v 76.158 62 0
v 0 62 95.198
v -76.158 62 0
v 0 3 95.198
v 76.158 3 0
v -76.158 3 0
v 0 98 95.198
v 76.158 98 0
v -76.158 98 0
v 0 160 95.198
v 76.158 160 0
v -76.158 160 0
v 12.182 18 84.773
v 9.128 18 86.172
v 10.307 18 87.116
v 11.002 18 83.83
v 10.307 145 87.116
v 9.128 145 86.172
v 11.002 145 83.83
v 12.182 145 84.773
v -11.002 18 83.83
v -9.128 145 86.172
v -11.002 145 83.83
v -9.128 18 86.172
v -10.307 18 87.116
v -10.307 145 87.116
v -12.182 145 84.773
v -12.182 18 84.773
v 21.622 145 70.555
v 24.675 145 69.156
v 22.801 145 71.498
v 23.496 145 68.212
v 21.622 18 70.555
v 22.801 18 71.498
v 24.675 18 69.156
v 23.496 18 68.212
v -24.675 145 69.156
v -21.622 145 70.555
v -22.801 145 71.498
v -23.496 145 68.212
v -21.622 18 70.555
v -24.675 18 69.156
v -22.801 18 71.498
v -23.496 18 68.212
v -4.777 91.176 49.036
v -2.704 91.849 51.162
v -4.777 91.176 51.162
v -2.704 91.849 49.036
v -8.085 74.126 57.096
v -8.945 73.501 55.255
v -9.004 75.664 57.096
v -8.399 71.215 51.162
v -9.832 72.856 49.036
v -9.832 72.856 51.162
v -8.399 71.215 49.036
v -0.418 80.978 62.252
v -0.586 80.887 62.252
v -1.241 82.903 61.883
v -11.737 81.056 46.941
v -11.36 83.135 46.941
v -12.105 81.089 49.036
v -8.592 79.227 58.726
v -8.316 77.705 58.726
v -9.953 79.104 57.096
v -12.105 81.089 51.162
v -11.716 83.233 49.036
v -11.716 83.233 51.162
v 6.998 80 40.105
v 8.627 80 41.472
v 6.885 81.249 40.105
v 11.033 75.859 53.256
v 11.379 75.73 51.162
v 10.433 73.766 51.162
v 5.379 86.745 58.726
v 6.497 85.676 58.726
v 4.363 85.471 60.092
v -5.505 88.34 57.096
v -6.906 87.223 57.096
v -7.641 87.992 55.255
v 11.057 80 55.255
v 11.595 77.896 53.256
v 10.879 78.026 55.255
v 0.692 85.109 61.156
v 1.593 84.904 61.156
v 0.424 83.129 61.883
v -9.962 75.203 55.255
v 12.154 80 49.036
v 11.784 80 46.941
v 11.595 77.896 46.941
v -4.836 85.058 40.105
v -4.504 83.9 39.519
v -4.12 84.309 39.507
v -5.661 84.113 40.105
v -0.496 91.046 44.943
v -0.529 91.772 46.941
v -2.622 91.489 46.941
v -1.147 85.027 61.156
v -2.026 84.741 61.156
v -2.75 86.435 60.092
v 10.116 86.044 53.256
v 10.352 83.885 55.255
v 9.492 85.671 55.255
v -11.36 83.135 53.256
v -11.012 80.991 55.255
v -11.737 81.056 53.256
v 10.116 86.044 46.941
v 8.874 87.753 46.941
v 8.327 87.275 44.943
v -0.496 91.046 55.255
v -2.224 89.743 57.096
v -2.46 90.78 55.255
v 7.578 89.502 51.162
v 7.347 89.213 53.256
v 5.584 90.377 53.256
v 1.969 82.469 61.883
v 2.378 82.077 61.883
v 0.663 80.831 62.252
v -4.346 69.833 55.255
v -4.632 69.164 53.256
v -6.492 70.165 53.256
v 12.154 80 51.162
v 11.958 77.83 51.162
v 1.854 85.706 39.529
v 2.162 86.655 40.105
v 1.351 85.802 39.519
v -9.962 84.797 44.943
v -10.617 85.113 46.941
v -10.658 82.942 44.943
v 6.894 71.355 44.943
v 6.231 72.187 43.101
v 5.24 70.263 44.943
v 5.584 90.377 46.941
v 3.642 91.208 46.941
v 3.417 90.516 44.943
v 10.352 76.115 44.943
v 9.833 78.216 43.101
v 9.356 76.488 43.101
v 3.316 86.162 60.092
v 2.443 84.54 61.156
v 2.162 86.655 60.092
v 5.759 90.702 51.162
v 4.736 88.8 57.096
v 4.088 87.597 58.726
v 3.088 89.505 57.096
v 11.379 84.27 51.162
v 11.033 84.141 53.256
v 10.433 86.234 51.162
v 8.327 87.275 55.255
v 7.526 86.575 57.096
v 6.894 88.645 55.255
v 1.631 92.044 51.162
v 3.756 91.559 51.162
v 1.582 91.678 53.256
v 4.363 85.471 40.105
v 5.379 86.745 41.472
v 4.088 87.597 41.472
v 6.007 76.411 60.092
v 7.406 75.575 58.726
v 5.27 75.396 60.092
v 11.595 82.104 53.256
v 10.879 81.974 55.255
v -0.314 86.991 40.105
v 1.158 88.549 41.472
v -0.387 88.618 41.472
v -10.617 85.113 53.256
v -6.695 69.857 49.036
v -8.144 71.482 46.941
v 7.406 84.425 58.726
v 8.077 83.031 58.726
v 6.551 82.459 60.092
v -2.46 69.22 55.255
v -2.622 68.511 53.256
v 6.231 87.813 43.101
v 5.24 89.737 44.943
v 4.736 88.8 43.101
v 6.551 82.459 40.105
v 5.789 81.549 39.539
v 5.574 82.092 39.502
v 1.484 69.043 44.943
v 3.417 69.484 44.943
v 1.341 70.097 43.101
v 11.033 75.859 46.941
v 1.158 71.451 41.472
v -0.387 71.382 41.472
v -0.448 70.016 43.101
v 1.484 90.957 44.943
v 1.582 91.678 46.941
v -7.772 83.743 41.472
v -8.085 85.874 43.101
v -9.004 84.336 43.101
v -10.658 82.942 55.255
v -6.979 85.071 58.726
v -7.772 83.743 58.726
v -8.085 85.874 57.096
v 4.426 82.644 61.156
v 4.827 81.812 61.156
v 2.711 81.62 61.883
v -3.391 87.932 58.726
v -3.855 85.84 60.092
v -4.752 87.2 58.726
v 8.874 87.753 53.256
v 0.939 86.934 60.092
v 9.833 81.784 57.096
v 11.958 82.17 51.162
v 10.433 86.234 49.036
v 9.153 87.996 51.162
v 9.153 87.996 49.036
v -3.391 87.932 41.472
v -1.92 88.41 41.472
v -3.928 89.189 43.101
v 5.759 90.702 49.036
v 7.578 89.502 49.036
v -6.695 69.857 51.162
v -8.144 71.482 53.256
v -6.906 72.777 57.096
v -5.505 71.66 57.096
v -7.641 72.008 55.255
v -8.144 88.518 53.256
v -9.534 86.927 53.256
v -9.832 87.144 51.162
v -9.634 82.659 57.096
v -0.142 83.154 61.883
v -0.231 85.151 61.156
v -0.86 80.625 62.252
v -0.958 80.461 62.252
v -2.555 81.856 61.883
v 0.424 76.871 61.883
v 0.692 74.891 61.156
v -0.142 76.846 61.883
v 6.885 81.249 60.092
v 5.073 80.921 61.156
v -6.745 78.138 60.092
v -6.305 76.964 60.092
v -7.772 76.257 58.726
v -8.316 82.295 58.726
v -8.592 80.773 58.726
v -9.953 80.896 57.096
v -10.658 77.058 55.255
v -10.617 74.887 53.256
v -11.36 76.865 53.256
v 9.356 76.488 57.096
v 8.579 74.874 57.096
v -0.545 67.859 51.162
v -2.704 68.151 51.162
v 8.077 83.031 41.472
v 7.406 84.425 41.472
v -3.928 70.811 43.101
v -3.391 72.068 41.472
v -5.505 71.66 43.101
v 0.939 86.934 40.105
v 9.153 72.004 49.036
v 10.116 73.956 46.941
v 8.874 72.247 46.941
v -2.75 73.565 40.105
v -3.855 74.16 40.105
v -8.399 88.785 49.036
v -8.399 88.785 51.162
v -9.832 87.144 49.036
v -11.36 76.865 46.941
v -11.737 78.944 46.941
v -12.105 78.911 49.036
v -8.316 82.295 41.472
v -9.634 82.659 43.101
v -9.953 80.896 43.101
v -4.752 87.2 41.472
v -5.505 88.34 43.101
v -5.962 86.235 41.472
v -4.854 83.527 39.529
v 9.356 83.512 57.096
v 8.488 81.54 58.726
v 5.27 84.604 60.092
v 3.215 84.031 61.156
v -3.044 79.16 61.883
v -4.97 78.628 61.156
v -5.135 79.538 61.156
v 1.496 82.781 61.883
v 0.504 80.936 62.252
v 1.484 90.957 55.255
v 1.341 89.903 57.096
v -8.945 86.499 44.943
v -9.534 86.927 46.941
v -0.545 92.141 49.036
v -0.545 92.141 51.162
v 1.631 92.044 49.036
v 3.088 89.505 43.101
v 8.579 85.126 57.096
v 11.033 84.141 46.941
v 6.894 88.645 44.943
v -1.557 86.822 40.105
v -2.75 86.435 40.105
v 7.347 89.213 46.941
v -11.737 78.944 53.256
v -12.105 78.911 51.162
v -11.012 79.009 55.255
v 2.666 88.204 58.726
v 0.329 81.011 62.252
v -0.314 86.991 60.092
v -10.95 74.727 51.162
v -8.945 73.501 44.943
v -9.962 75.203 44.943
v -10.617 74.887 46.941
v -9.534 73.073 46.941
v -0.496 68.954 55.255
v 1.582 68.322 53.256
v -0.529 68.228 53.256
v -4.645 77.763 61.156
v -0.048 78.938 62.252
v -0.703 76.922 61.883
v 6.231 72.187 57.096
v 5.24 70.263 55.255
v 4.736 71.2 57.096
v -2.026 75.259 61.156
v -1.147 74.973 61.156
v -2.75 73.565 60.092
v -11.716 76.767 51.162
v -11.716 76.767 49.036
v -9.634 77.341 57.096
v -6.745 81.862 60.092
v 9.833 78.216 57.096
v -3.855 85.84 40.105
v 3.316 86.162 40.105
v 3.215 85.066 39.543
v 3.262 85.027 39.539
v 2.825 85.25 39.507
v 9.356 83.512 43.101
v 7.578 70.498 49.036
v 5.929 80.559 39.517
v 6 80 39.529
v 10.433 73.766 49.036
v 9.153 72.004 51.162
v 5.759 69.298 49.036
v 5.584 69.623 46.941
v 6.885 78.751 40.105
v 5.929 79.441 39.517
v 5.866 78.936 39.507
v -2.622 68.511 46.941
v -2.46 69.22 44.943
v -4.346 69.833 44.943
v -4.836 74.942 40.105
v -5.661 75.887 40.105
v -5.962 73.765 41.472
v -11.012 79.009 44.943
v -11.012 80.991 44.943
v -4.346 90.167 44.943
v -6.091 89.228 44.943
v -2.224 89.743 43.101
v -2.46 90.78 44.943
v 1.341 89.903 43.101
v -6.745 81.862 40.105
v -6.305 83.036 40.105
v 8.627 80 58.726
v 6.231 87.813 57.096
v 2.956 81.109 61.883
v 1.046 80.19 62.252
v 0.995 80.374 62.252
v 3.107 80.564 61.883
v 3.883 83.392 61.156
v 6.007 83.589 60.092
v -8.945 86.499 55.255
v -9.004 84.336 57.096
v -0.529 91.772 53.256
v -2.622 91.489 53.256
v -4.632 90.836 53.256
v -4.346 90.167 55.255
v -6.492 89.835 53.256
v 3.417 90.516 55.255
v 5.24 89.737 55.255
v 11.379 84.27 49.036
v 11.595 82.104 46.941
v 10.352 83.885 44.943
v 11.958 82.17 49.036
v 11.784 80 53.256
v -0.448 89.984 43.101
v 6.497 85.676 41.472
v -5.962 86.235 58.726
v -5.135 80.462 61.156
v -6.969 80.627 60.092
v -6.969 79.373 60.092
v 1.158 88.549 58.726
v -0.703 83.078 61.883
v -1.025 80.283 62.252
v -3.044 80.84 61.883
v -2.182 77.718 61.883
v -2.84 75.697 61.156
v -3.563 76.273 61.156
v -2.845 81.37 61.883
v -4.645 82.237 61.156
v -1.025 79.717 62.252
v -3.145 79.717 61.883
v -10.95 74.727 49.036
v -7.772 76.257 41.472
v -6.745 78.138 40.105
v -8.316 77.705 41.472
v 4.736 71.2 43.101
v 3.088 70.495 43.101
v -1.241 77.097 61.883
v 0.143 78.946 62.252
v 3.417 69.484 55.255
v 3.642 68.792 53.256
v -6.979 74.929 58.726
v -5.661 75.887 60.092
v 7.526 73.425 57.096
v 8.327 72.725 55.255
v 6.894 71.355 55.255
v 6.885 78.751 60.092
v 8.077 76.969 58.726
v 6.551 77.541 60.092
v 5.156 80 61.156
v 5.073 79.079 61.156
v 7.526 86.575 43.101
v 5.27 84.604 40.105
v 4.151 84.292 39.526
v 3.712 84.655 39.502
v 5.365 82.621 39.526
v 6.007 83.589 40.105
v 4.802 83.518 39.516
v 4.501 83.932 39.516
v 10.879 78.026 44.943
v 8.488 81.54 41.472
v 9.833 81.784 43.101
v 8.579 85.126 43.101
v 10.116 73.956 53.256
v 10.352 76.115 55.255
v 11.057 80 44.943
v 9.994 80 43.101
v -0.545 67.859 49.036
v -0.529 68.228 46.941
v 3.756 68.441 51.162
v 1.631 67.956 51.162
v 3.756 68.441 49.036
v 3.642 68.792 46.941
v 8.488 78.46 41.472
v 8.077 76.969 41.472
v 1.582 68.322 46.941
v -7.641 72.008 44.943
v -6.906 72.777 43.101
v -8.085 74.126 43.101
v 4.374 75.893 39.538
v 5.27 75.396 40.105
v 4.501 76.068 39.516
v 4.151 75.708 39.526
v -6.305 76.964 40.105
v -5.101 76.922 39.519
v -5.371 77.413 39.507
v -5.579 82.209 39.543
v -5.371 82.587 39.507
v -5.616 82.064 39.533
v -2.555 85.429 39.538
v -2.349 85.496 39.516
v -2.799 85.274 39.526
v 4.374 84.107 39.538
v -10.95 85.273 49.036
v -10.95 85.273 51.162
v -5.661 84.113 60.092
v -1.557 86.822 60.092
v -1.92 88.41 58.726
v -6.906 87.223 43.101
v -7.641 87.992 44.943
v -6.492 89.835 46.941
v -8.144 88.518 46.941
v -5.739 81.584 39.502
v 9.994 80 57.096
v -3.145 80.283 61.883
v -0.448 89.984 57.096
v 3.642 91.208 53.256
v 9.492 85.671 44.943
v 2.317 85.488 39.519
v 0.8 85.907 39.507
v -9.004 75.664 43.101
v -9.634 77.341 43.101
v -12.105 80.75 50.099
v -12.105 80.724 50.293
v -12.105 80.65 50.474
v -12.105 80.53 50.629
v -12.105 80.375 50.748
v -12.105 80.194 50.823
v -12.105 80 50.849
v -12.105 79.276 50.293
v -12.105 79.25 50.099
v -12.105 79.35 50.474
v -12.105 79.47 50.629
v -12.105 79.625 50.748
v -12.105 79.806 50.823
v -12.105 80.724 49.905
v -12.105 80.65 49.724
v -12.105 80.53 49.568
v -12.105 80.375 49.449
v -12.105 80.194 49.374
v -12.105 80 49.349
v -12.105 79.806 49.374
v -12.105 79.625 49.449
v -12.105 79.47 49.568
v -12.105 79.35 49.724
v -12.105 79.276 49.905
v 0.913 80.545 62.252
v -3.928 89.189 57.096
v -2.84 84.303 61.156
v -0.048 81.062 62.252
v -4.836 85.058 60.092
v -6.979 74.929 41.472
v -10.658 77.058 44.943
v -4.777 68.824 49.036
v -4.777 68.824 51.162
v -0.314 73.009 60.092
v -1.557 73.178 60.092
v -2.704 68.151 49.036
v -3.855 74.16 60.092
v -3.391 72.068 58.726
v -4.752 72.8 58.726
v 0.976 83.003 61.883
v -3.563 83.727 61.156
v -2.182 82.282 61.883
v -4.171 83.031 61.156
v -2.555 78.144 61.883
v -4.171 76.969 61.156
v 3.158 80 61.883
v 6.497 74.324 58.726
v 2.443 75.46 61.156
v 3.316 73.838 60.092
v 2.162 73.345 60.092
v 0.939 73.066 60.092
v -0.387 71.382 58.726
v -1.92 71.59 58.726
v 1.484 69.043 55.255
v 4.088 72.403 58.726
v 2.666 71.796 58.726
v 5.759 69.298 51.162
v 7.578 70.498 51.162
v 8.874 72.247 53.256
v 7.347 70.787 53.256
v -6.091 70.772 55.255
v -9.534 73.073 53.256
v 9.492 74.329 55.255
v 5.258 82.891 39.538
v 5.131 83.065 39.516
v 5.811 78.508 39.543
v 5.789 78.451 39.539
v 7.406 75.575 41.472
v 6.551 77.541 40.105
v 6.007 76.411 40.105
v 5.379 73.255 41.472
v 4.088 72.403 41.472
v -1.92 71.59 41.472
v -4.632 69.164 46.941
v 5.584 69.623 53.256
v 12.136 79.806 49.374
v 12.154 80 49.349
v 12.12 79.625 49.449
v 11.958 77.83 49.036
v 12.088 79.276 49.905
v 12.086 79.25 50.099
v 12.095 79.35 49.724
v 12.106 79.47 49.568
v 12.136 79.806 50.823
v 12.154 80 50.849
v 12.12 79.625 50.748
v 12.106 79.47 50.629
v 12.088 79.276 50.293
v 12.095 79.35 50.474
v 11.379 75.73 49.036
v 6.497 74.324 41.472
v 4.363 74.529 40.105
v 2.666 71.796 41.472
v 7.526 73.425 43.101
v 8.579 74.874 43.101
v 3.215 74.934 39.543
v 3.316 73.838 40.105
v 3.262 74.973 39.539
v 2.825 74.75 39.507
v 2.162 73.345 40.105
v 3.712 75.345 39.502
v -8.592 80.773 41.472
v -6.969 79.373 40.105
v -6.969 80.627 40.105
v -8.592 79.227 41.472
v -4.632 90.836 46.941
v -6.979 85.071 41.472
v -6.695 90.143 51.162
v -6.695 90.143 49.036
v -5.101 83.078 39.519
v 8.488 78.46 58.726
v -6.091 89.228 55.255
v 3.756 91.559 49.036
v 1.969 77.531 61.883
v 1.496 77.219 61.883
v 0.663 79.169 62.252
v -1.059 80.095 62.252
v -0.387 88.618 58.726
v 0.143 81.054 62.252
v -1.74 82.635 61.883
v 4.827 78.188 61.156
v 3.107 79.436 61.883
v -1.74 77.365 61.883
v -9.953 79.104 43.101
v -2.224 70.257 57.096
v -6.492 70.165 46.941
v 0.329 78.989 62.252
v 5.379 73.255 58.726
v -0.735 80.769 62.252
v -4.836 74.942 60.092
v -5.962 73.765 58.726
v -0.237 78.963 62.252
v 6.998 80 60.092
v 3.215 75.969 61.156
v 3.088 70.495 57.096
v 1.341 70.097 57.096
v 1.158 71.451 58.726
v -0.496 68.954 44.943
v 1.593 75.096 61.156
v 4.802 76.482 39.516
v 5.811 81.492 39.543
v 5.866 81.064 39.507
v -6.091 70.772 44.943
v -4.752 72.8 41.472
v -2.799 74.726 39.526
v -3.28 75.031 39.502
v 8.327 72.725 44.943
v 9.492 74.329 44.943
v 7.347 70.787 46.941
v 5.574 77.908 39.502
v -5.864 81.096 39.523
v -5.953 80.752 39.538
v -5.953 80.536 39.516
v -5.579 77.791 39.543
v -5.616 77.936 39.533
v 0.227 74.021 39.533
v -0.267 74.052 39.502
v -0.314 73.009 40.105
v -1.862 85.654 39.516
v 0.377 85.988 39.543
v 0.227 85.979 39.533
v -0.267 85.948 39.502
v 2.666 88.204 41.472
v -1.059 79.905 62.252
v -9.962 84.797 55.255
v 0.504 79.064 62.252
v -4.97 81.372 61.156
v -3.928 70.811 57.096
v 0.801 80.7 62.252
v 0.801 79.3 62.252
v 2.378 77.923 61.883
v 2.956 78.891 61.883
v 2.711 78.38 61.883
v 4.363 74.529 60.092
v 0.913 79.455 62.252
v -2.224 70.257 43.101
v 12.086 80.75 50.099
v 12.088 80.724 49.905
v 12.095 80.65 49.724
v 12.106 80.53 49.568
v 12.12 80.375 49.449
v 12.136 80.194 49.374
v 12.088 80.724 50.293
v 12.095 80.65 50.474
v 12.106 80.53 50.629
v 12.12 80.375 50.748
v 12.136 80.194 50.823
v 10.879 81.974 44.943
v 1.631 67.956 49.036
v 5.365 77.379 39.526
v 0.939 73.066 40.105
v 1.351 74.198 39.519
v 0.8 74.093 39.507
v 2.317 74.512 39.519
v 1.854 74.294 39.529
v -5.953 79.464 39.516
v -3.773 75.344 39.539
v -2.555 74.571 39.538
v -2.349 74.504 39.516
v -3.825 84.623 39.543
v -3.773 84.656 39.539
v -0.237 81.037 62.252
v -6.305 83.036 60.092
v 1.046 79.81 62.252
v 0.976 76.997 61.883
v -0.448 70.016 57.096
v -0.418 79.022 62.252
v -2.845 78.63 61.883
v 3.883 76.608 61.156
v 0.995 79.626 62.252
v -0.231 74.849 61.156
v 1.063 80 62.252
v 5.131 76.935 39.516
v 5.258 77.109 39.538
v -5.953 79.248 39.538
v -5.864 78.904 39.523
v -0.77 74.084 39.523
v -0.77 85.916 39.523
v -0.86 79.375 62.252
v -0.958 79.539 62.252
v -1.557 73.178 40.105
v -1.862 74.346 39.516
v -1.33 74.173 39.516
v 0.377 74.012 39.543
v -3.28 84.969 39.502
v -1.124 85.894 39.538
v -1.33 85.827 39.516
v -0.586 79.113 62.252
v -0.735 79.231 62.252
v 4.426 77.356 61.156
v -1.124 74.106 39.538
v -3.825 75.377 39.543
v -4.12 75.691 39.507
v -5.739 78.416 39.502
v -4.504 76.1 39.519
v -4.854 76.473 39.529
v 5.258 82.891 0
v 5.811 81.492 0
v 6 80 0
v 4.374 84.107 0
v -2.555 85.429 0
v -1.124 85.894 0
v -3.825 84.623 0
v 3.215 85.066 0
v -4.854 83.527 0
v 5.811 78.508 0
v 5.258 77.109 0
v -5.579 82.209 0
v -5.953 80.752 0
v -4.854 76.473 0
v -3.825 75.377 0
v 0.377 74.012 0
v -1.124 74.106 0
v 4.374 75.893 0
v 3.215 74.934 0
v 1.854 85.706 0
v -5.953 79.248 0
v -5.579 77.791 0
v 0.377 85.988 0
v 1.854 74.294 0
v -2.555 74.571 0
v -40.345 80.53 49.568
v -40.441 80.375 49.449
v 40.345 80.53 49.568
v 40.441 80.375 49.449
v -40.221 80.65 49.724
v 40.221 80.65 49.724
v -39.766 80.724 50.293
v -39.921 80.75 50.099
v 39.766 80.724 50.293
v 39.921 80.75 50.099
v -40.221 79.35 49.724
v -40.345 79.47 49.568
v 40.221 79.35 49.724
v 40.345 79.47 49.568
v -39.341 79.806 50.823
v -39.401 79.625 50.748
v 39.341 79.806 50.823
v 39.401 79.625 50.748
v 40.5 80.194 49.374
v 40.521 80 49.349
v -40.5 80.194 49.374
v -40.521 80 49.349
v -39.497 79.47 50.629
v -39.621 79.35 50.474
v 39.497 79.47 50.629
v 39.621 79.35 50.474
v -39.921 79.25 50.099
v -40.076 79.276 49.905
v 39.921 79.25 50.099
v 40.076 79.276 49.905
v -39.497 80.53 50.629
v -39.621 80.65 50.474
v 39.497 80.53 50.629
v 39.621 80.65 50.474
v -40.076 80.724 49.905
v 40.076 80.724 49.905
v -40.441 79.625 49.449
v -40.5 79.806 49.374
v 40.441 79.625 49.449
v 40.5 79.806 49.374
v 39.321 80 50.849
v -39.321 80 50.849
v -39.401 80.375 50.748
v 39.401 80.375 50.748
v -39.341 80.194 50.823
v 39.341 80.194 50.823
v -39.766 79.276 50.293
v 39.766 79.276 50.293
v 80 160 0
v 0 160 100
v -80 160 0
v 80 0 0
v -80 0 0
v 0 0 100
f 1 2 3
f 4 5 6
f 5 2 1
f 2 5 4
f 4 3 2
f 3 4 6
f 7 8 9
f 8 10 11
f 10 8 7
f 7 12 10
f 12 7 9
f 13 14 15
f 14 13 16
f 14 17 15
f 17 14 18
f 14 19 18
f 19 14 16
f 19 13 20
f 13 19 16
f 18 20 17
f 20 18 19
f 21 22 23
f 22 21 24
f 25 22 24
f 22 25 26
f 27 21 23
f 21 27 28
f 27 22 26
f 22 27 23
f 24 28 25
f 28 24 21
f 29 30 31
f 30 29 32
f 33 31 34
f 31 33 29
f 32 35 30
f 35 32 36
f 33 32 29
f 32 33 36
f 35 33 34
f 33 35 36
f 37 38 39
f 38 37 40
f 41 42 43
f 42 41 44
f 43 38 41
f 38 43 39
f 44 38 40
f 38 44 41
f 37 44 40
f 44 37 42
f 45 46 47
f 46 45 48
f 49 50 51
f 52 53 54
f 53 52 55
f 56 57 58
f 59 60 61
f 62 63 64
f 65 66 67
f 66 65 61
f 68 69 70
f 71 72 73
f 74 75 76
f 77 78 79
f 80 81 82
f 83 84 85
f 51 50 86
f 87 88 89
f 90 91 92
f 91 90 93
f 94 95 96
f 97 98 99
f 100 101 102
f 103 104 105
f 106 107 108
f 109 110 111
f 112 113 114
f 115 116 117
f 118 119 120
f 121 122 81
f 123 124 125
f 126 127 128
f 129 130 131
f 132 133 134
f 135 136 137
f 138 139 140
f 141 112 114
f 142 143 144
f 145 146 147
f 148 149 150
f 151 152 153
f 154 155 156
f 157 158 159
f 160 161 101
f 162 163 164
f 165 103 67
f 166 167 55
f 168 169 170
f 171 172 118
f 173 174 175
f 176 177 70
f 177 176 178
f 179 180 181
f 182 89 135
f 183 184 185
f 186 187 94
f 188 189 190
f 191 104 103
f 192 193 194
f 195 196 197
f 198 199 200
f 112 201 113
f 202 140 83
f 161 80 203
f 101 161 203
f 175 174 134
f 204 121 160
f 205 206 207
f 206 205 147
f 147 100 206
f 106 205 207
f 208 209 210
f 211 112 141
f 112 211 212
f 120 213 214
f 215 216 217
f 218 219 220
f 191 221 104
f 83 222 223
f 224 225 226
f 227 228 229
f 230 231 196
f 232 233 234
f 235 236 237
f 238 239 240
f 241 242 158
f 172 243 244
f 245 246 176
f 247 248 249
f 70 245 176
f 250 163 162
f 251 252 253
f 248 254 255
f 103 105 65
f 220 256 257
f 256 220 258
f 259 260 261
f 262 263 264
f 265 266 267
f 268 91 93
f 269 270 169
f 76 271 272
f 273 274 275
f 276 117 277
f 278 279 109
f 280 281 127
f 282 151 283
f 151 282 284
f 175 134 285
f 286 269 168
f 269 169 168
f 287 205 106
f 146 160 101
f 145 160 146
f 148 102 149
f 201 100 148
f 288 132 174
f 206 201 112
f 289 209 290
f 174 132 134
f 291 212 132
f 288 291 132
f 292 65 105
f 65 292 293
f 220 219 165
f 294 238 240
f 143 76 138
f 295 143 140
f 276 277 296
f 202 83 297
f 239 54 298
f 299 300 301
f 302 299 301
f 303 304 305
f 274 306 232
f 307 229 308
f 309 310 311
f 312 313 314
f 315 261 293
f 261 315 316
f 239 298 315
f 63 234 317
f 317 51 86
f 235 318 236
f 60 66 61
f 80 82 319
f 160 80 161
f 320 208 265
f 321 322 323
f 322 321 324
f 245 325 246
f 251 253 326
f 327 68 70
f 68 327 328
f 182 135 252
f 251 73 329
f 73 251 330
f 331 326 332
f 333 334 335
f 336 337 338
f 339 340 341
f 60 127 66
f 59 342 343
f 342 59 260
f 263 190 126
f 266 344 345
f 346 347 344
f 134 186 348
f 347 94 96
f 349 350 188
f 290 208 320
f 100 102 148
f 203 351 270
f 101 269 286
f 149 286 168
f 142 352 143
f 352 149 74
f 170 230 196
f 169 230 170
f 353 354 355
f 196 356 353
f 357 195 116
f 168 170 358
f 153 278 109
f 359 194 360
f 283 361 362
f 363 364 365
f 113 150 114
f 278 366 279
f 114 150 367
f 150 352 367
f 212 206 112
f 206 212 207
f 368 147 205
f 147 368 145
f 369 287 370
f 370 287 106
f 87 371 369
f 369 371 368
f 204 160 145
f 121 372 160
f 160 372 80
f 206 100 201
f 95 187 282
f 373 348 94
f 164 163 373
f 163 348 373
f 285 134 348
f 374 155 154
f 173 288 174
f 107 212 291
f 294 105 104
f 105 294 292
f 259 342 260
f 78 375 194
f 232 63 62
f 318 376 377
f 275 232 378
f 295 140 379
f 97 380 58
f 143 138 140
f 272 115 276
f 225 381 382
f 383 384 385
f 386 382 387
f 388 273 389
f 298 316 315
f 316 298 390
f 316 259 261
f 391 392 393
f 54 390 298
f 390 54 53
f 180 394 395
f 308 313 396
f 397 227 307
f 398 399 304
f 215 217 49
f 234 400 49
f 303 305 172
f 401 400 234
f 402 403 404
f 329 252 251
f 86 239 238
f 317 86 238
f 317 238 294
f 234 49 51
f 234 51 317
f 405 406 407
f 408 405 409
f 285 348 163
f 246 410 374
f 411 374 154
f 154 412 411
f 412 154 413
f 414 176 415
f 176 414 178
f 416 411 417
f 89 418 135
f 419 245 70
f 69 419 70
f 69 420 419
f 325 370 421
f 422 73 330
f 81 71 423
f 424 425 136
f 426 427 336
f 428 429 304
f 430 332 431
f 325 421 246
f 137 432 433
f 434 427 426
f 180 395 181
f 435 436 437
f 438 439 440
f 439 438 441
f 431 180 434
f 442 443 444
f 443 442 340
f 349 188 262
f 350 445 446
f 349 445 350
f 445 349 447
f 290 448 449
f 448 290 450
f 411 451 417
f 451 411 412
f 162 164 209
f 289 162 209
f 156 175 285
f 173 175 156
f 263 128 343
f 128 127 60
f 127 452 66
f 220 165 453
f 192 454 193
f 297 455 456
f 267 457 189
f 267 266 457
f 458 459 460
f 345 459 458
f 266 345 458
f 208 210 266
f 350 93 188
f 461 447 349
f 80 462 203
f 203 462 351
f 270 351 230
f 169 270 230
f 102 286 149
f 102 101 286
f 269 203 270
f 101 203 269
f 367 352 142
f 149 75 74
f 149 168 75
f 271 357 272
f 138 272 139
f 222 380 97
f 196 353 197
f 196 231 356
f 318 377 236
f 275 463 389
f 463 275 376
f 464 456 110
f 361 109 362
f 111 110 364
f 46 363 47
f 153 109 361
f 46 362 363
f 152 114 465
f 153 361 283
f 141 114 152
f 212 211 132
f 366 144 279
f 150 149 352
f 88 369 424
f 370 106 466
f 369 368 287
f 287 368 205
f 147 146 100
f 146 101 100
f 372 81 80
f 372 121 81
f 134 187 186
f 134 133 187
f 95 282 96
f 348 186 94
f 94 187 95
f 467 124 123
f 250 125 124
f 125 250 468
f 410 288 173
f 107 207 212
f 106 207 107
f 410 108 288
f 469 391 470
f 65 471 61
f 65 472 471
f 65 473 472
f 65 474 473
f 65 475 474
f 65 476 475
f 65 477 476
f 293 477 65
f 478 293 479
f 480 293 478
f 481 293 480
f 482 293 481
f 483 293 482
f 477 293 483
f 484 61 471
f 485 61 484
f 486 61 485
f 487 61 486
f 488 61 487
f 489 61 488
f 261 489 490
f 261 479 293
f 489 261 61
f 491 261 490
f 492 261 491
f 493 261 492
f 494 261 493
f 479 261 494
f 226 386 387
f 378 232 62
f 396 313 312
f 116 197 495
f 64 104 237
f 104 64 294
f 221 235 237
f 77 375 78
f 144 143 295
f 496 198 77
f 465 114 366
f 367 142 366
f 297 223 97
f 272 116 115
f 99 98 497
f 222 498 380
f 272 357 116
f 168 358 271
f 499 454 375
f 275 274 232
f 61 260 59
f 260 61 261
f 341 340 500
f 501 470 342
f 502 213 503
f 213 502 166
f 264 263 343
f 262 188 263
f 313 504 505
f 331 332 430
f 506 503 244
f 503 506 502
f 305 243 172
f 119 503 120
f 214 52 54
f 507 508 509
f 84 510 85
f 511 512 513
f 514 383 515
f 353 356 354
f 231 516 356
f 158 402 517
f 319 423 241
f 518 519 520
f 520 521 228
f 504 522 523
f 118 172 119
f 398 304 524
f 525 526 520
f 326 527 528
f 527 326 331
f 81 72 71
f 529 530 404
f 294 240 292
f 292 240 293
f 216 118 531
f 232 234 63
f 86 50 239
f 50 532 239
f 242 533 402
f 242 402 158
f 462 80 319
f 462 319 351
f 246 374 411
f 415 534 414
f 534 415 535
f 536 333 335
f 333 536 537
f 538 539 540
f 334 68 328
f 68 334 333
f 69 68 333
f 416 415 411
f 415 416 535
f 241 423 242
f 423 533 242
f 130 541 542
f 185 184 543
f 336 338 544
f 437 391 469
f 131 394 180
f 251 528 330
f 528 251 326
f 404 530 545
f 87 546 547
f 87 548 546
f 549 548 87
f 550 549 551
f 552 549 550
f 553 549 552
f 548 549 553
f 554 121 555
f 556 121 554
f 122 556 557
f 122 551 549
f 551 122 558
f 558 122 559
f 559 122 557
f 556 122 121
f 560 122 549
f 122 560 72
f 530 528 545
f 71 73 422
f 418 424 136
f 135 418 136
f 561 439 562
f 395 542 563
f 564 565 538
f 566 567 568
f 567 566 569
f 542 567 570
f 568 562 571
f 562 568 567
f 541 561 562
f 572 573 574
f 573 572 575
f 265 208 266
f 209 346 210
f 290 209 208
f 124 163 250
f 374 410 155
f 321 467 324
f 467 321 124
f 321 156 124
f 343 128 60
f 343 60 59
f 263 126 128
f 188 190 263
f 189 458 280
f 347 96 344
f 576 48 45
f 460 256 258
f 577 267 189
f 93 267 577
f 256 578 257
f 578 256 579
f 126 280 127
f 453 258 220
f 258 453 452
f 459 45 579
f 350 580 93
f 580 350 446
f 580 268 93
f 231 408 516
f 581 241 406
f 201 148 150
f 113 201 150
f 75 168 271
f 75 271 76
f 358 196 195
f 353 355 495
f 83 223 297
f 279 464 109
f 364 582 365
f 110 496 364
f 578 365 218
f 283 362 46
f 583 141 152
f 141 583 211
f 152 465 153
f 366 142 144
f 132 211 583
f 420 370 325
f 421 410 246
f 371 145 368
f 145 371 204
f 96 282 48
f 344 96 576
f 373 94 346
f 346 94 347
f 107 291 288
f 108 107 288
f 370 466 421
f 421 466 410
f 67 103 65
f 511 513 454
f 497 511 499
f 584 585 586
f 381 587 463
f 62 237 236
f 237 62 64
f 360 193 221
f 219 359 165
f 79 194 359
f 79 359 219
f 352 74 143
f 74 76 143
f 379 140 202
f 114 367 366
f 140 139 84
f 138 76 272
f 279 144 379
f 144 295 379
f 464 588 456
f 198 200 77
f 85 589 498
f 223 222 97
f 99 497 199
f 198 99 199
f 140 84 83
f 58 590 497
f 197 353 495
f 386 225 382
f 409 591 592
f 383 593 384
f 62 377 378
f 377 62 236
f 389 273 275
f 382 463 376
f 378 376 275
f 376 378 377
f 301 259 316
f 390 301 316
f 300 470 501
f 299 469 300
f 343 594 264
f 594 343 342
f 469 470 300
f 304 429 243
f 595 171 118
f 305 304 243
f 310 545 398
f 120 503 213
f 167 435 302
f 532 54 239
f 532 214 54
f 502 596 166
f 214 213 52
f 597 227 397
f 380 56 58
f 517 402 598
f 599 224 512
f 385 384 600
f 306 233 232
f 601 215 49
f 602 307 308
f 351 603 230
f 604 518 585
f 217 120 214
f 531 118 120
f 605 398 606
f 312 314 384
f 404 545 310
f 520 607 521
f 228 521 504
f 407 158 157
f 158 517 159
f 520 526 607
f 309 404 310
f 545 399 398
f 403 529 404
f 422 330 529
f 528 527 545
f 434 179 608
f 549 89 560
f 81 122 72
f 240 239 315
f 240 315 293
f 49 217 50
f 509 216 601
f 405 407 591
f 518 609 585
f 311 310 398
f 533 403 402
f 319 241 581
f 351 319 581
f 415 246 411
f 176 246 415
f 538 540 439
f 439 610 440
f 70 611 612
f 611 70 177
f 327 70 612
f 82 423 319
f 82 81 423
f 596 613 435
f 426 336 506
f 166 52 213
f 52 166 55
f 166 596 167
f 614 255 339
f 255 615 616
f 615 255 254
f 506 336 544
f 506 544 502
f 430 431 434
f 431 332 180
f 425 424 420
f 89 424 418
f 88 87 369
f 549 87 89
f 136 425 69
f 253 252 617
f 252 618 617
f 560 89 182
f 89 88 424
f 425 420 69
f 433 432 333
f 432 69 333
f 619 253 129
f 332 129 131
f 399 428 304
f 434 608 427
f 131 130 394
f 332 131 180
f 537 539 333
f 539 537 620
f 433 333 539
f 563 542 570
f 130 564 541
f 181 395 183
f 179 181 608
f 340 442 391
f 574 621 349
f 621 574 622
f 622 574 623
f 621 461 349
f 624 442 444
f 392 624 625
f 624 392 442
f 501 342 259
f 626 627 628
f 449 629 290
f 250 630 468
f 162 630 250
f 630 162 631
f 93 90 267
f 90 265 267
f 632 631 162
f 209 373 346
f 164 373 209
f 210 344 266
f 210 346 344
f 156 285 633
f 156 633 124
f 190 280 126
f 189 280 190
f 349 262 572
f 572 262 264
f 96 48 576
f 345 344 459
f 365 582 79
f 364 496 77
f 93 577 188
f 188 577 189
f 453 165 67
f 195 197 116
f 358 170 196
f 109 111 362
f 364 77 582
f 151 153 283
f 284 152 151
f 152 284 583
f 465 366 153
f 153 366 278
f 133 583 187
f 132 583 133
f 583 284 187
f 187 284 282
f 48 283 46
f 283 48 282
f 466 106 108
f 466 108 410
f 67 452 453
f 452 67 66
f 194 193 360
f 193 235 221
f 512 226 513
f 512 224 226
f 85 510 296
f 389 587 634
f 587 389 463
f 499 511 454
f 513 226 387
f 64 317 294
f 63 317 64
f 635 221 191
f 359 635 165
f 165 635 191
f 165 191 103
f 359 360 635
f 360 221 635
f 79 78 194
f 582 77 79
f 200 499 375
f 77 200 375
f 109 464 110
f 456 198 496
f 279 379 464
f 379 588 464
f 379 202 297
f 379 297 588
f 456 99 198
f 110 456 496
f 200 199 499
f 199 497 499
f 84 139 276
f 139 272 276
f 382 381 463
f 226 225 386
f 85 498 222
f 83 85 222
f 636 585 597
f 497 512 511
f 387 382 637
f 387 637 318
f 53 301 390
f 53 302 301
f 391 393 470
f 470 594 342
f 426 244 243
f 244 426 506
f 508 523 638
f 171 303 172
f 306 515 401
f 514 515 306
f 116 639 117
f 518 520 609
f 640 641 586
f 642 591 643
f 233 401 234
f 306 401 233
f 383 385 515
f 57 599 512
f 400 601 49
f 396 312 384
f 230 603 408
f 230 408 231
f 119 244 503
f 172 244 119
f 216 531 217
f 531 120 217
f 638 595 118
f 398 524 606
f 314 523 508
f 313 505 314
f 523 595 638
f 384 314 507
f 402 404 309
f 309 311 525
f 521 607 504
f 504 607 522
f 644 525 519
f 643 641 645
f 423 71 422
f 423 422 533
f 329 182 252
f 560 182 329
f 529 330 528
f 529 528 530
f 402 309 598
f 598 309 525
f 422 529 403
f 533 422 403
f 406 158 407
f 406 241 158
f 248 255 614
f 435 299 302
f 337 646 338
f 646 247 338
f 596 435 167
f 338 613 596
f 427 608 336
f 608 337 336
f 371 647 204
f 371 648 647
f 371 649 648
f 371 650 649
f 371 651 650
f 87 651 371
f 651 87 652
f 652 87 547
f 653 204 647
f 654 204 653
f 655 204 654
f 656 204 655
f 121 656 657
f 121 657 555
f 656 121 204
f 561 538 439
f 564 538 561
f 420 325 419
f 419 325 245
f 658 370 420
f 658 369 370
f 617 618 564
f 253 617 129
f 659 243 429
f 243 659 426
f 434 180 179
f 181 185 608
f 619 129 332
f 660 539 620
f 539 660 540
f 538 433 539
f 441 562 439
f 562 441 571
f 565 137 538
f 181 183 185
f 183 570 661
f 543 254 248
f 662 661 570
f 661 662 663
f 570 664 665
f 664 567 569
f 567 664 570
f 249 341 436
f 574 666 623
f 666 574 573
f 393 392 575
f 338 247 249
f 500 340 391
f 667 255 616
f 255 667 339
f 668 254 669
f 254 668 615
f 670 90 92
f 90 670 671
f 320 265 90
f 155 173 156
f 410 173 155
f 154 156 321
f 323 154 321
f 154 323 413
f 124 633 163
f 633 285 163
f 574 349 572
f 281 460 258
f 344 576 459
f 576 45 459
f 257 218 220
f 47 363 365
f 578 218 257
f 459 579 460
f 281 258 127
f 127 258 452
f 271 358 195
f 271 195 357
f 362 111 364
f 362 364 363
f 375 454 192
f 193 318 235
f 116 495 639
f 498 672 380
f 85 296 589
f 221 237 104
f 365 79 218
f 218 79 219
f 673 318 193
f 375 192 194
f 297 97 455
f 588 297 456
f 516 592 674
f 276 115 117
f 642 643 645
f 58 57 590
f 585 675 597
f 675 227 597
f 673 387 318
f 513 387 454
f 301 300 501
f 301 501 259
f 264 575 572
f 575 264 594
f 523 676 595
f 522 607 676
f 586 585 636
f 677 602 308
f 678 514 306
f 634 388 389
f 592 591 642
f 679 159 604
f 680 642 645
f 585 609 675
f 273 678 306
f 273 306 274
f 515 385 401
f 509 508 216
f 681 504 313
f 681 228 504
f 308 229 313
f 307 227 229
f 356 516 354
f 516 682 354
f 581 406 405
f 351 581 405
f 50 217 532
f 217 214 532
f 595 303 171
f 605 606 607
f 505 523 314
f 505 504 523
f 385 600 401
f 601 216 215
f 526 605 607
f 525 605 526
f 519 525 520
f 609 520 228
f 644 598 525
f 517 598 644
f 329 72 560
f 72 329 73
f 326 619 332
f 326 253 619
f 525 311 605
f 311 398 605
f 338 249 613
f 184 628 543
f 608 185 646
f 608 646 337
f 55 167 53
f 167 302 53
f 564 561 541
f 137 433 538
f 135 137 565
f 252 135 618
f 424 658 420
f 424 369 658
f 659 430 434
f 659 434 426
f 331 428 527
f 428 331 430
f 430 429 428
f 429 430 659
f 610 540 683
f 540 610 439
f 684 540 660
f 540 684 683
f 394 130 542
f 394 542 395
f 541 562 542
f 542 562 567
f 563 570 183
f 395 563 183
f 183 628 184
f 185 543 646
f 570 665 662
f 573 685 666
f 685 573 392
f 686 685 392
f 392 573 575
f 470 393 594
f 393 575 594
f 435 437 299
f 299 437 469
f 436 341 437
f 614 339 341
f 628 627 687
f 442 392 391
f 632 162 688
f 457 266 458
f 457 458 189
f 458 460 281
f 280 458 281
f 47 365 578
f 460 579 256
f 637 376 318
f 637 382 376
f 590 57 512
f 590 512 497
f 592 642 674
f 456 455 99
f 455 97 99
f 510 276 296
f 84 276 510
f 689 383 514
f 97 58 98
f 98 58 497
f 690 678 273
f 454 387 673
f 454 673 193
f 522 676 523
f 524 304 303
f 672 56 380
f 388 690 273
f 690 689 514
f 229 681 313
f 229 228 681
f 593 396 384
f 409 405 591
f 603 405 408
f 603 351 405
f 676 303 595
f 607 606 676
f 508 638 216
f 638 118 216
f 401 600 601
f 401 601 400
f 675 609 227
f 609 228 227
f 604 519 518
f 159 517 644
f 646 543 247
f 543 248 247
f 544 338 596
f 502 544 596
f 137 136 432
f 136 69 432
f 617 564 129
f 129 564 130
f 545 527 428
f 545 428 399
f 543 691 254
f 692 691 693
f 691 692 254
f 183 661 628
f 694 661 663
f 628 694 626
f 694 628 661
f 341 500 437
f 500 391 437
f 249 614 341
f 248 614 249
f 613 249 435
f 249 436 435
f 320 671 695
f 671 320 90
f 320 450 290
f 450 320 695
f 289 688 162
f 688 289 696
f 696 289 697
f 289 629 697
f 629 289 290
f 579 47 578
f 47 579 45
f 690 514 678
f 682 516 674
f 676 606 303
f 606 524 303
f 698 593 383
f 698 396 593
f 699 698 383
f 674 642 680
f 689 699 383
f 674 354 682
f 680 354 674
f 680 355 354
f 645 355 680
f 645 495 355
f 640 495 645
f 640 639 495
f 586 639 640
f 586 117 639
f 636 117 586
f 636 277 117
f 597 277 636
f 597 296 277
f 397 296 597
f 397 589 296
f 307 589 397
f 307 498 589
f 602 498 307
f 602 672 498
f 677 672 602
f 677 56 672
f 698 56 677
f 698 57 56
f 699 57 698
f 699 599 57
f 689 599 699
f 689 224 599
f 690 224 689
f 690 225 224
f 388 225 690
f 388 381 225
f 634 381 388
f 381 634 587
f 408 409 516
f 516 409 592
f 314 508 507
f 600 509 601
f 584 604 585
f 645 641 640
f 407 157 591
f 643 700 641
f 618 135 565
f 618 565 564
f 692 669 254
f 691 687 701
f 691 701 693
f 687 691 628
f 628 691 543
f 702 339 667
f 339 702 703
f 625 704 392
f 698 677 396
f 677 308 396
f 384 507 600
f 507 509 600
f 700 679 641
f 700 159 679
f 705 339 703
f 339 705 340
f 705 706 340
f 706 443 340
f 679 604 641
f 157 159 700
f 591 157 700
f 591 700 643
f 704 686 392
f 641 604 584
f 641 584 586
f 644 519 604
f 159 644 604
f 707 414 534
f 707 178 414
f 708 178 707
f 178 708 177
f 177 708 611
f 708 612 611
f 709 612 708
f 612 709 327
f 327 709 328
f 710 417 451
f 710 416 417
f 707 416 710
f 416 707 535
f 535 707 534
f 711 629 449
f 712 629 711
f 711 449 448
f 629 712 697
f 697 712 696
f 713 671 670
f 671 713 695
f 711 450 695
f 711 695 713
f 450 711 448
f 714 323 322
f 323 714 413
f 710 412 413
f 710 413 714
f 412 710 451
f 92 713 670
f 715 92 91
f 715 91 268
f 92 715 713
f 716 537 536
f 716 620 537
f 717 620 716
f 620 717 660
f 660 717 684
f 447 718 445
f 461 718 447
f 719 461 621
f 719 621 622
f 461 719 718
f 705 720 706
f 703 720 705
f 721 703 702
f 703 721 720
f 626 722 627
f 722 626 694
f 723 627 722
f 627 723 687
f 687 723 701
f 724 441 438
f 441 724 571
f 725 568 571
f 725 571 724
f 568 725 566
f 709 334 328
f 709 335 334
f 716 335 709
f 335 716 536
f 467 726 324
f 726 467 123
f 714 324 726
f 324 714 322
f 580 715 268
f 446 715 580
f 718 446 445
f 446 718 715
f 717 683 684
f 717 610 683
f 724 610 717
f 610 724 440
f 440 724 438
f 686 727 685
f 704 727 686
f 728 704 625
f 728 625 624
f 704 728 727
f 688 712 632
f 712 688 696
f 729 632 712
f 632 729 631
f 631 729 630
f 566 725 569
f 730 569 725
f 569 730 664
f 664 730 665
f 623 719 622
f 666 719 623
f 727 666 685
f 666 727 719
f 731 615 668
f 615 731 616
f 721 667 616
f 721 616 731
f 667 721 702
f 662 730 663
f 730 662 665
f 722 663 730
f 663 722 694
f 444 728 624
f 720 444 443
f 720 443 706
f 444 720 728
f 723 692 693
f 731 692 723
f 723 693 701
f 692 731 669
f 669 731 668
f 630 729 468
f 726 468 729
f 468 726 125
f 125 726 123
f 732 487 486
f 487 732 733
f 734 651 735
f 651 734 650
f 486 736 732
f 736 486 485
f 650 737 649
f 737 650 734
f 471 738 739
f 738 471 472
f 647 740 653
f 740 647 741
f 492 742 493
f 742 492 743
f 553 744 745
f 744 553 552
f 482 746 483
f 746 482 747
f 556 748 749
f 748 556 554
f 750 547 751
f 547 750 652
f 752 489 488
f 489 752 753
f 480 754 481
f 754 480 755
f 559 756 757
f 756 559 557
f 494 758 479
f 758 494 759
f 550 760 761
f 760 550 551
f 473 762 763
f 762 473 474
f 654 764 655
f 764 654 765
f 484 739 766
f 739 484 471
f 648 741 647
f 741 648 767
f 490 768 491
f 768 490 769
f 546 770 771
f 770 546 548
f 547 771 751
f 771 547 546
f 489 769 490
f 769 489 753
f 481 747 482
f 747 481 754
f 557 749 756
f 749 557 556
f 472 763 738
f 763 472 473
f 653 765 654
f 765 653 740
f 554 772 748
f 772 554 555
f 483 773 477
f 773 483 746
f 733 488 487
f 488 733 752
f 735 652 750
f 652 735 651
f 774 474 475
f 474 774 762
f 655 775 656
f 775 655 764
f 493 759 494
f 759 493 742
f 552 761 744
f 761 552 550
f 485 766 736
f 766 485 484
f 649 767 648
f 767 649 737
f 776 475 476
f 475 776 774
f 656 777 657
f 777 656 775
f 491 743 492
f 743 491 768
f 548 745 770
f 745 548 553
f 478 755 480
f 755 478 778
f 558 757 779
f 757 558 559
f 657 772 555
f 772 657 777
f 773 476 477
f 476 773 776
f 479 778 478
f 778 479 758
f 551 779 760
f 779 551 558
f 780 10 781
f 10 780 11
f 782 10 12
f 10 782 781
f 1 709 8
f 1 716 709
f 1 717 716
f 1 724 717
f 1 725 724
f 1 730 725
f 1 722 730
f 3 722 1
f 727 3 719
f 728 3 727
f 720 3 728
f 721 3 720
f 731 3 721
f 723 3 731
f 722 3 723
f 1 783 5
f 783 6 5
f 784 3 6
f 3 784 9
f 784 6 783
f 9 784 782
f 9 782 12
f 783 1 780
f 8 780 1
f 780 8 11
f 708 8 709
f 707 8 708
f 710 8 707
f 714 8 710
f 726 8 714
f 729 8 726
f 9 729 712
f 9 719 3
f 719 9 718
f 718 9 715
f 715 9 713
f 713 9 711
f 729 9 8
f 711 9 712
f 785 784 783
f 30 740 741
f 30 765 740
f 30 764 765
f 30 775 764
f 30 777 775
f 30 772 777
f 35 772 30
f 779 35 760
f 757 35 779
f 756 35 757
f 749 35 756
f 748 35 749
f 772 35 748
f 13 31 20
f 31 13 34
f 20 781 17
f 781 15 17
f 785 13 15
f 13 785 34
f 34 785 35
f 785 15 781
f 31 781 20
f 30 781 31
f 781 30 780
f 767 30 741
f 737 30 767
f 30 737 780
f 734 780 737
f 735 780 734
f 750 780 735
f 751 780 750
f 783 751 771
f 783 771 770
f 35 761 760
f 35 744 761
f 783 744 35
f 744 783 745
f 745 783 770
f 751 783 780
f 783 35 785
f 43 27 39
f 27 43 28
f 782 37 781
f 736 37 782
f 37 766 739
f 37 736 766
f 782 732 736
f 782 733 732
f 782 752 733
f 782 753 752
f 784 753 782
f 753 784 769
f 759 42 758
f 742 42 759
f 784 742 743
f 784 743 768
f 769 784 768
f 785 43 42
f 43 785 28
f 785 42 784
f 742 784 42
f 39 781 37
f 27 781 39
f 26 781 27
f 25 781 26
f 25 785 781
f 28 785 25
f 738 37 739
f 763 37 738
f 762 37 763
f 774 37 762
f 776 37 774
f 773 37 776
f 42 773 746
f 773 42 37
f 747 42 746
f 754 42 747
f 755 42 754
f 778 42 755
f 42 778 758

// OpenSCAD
// ============================================================================
// KORPUS "MORPH" v7 - glowica SZLIFIERKI NAROZNEJ (corner sander)
// do plyt gipsowo-kartonowych, montowana na dragu teleskopowym.
// ----------------------------------------------------------------------------
// Geometria: klin Λ o profilu trojkatnym.
//   - przednia scianka ZAMKNIETA (trojkatna plansza z napisem "morph" wypuklym)
//   - tylny koniec OTWARTY (zaokraglone konce skrzydel - opcjonalne)
//   - wnetrze PUSTE ("BE HOLLOW INSIDE")
//   - mostek lity w srodku dlugosci z gniazdem kulkowym OD DOLU
// Wymiary: Jacek podal dlugosc=160, wys=100, pol-podstawy=80, kula=24 mm
// Material: PETG. Druk: kalenica u gory, spod na stole - bez podpor.
// Wersja jednoplikowa (telefon / OpenSCAD Playground / desktop).
// Data: 2026-08-22
// ============================================================================

/* [Co renderowac] */
czesc = "wszystko"; // [wszystko, korpus, podglad_gniazda]

/* [Wymiary glowne] */
// DLUGOSC na kalenicy [mm]
dlugosc = 160; // [60:1:250]
// WYSOKOSC od podstawy skrzydel do kalenicy [mm]
wys_glowna = 100; // [30:1:200]
// POLOWA SZEROKOSCI podstawy (poziomy zasieg jednego skrzydla) [mm]
polowa_podstawy = 80; // [20:1:160]
// grubosc scianki skrzydel [mm]
grubosc_scianki = 3.0; // [1.6:0.1:6]
// grubosc przedniej scianki czolowej [mm]
grubosc_czola = 3.0; // [1.6:0.1:8]

/* [Zaokraglenie tylnych koncow skrzydel] */
// UWAGA: wolny render na telefonie - wlacz tylko na desktopie
zaokraglenie_koncow_wl = false; // [true, false]
zaokr_promien = 12; // [0:0.5:30]

/* [Rowki wzdluzne (usztywnienia)] */
rowki_wl = true; // [true, false]
rowki_liczba = 2; // [0:1:6]
rowek_szer = 3.0; // [1:0.1:6]
rowek_glebokosc = 1.5; // [0.4:0.1:3]
rowek_od_kalenicy = 18; // [3:0.5:40]
rowek_odstep = 20; // [4:0.5:40]
rowek_margines = 15; // [0:1:40]

/* [Plaster miodu (dekoracja zewn. skrzydel)] */
// UWAGA: ~600 heksagonow na skrzydlo - bardzo wolny render na telefonie
plaster_wl = false; // [true, false]
heks_rozstaw = 8; // [3:0.5:15]
heks_scianka = 1.0; // [0.4:0.1:2]
plaster_glebokosc = 1.0; // [0.4:0.1:3]
plaster_margines = 8; // [0:0.5:20]

/* [Napis na czolowej sciance] */
// UWAGA: text() wiesza OpenSCAD Playground - wlacz tylko na desktopie
napis_wl = false; // [true, false]
napis = "morph";
napis_wys = 14; // [4:0.5:24]
napis_glebokosc = 1.2; // [0.2:0.1:4]
// "" = font domyslny (dziala wszedzie, w tym telefon/Playground)
// "Liberation Sans:style=Bold" = desktop OpenSCAD
napis_font = "";

/* [Gniazdo kulkowe od spodu] */
gniazdo_wl = true; // [true, false]
kula_srednica = 24; // [6:0.5:40]
kula_luz = 0.4; // [0:0.05:1.5]
wpust_srednica = 12; // [3:0.5:25]
gniazdo_pozycja = 0.5; // [0.1:0.05:0.9]
drut_srednica = 1.5; // [0.5:0.1:3.0]
mostek_szer = 36; // [10:1:80]

/* [Kalibracja drukarki] */
KOREKTA = 0.0; // [-0.3:0.05:0.3]

/* [Jakosc] */
BLAD_CIECIWY = 0.05; // [0.02:0.01:0.2]

/* [Hidden] */
EPS = 0.01;
function fn_walec(r) = max(24, ceil(360/(2*acos(1-min(0.99,BLAD_CIECIWY/max(0.1,r))))));
function fn_kula(r)  = max(32, ceil(360/(2*acos(1-min(0.99,BLAD_CIECIWY/max(0.1,r))))));

// wartosci pochodne
wys       = wys_glowna;
b_polowa  = polowa_podstawy;
polkat    = atan2(b_polowa, wys);          // kat od pionu do skrzydla
t         = grubosc_scianki;
sk        = sqrt(wys*wys + b_polowa*b_polowa); // dlugosc skrzydla wzdluz powierzchni
h_in      = max(0.5, wys - t / sin(polkat));
dno_in    = -1;
x_dol_in  = b_polowa * (h_in - dno_in) / wys;

echo(str("Klin Morph v7: dl=",dlugosc,"  wys=",wys,"  pol_podst=",b_polowa,
         "  kat=",round(2*polkat*10)/10,"  sk=",round(sk*10)/10,"  t=",t));

// ============================================================================
// PROFILE 2D
// ============================================================================

module trojkat_zewn_2d() {
    polygon([[-b_polowa, 0], [b_polowa, 0], [0, wys]]);
}

module trojkat_wewn_2d() {
    polygon([[0, h_in], [x_dol_in, dno_in], [-x_dol_in, dno_in]]);
}

module heks_2d(w, scianka) {
    d_op = (w - scianka) * 2/sqrt(3);
    rotate(90) circle(d = d_op, $fn = 6);
}

module heks_siatka(dl, wys_pola, w, scianka) {
    krok_x = w;
    krok_y = w * sqrt(3)/2;
    n_x = ceil(dl / krok_x) + 1;
    n_y = ceil(wys_pola / krok_y) + 1;
    intersection() {
        translate([dl/2, wys_pola/2, 0]) square([dl, wys_pola], center = true);
        union() {
            for (iy = [0 : n_y])
                for (ix = [0 : n_x]) {
                    x = ix * krok_x + (iy % 2 == 0 ? 0 : krok_x/2);
                    y = iy * krok_y;
                    translate([x, y, 0]) heks_2d(w, scianka);
                }
        }
    }
}

// ============================================================================
// BRYLY 3D
// ============================================================================

module bryla_zewn() {
    translate([0, dlugosc, 0])
        rotate([90, 0, 0])
            linear_extrude(height = dlugosc)
                trojkat_zewn_2d();
}

// Hollowing: usuwa wnetrze w zakresie y0..y1
// Wywoływane dwukrotnie (przed i za mostkiem) albo raz (bez gniazda).
// Zaczynam od grubosc_czola, zeby sciana czolowa (y=0..grubosc_czola) zostala lita.
module wydrazenie(y0, y1) {
    if (y1 > y0)
        translate([0, y1, 0])
            rotate([90, 0, 0])
                linear_extrude(height = y1 - y0)
                    trojkat_wewn_2d();
}

// zaokraglenie TYLNYCH koncow skrzydel (tylko y=dlugosc, przod jest zamkniety)
module zaokraglenie_koncow_neg() {
    if (zaokraglenie_koncow_wl && zaokr_promien > 0) {
        r = zaokr_promien;
        for (znak_x = [-1, 1]) {
            translate([znak_x * (b_polowa - r), dlugosc - r, -EPS])
                difference() {
                    translate([-r*znak_x, 0, 0])
                        cube([2*r, r + EPS, r + 2]);
                    translate([r - znak_x*r*2, 0, 0])
                        cylinder(h = r + 3, r = r, $fn = fn_walec(r));
                }
        }
    }
}

module rowek(znak_bok, r_od_kalenicy) {
    dl_rowka = max(0, dlugosc - grubosc_czola - 2*rowek_margines);
    if (dl_rowka > 0) {
        px = znak_bok * r_od_kalenicy * sin(polkat);
        pz = wys - r_od_kalenicy * cos(polkat);
        // rowek wzdluzny od sciany czolowej + margines do tylnego konca
        translate([px, grubosc_czola + rowek_margines + dl_rowka/2, pz])
            rotate([0, -znak_bok * polkat, 0])
                cube([2*rowek_glebokosc + 2*EPS, dl_rowka, rowek_szer], center = true);
    }
}

module rowki_wszystkie() {
    if (rowki_wl && rowki_liczba > 0) {
        for (i = [0 : rowki_liczba - 1]) {
            r_dist = rowek_od_kalenicy + i * rowek_odstep;
            if (r_dist < sk - 4) {
                rowek(+1, r_dist);
                rowek(-1, r_dist);
            }
        }
    }
}

module plaster_na_skrzydle(znak_bok) {
    d_pola = max(0, dlugosc - grubosc_czola - 2*plaster_margines);
    w_pola = max(0, sk - 2*plaster_margines);
    if (plaster_wl && d_pola > 0 && w_pola > 0) {
        cx = znak_bok * (sk/2) * sin(polkat);
        cy = grubosc_czola + plaster_margines + d_pola/2;
        cz = wys - (sk/2) * cos(polkat);
        translate([cx, cy, cz])
            rotate([0, -znak_bok * polkat, 0])
                translate([-plaster_glebokosc + EPS, -d_pola/2, -w_pola/2])
                    rotate([0, 90, 0])
                        linear_extrude(height = plaster_glebokosc + EPS)
                            heks_siatka(d_pola, w_pola, heks_rozstaw, heks_scianka);
    }
}

// Napis "morph" WYPUKLY na przedniej sciance czolowej
// Litery wysuwaja sie w -Y (przed czolo modelu)
module napis_na_czole() {
    if (napis_wl && napis != "") {
        // pozycja: srodek X, ~30% wysokosci od podstawy skrzydel
        // zakres Y: od -(napis_glebokosc) do +1 (1mm wnika w czolo dla polaczenia)
        translate([0, 1, wys * 0.30])
            rotate([90, 0, 0])
                linear_extrude(height = napis_glebokosc + 1)
                    if (napis_font != "")
                        text(napis, size = napis_wys, font = napis_font,
                             halign = "center", valign = "center");
                    else
                        text(napis, size = napis_wys,
                             halign = "center", valign = "center");
    }
}

// srodek kuli w Z
function gz_srodek() = (h_in + dno_in) / 2 + 3;

module gniazdo_kulkowe_neg() {
    if (gniazdo_wl) {
        r  = kula_srednica/2 + kula_luz/2;
        cx = 0;
        cy = gniazdo_pozycja * dlugosc;
        cz = gz_srodek();
        // sfera
        translate([cx, cy, cz])
            sphere(r = r, $fn = fn_kula(r));
        // wpust szyjki draga od dolu
        translate([cx, cy, dno_in - 5])
            cylinder(h = cz - dno_in + 5, d = wpust_srednica,
                     $fn = fn_walec(wpust_srednica/2));
        // kanal poprzeczny na drut spr.
        if (drut_srednica > 0)
            translate([-b_polowa - 5, cy, cz])
                rotate([0, 90, 0])
                    cylinder(h = 2*b_polowa + 10, d = drut_srednica,
                             $fn = fn_walec(drut_srednica/2));
    }
}

// ============================================================================
// KORPUS
// ============================================================================

module korpus() {
    y_c  = gniazdo_pozycja * dlugosc;
    y_m0 = y_c - mostek_szer/2;
    y_m1 = y_c + mostek_szer/2;
    union() {
        difference() {
            bryla_zewn();
            // wydrazenie zaczyna sie OD grubosc_czola, zeby sciana czolowa zostala lita
            if (gniazdo_wl) {
                wydrazenie(grubosc_czola, y_m0);
                wydrazenie(y_m1, dlugosc + 2);
            } else {
                wydrazenie(grubosc_czola, dlugosc + 2);
            }
            zaokraglenie_koncow_neg();
            rowki_wszystkie();
            plaster_na_skrzydle(+1);
            plaster_na_skrzydle(-1);
            gniazdo_kulkowe_neg();
        }
        // napis wypukly doklejony do czola (na zewnatrz bryly)
        napis_na_czole();
    }
}

module podglad_gniazda() {
    intersection() {
        korpus();
        translate([-40, gniazdo_pozycja * dlugosc - 28, dno_in])
            cube([80, 56, wys + 5]);
    }
    %translate([0, gniazdo_pozycja * dlugosc, gz_srodek()])
        sphere(d = kula_srednica, $fn = fn_kula(kula_srednica/2));
}

// ============================================================================
// WYWOLANIE
// ============================================================================
if      (czesc == "wszystko")        korpus();
else if (czesc == "korpus")          korpus();
else if (czesc == "podglad_gniazda") podglad_gniazda();

// ============================================================================
// CO KRECIC SUWAKAMI
// ============================================================================
// * wys_glowna      - wysokosc od dolnej krawedzi skrzydel do kalenicy.
//                     Zmierz suwmiarka na gotowym lub ustal proporcje.
//                     Jacek: 100 mm.
// * polowa_podstawy - jak szeroko jedno skrzydlo siega poziomo od osi.
//                     Jacek: 80 mm. Lacznie obie = 160 mm.
// * dlugosc         - dlugosc wzdluz kalenicy. Jacek: 160 mm.
// * kula_srednica   - ZMIERZ kulke na dragu suwmiarka. Jacek: 24 mm.
// * kula_luz        - +0.1 jesli za ciasno, -0.1 jesli lataje.
// * grubosc_czola   - grubosc przedniej zamknietej scianki.
// * rowki_liczba    - usztywnienia wzdluzne (2 = jak na zdjeciach).
// * plaster_wl      - wzor plastra miodu na zewnatrz. WYLACZ na telefonie!
// * napis_wyl       - napis "morph" na czole. Font domyslny = dziala wszedzie.
//
// ============================================================================
// WYMIARY v7 (przy domyslnych parametrach)
// ============================================================================
//   dlugosc              160 mm
//   wys_glowna           100 mm  (Jacek)
//   polowa_podstawy       80 mm  (Jacek)
//   kat_rozwarcia      ~77.3°   (derived: 2*atan(80/100))
//   skrzydlo_pow       ~128 mm  (sqrt(100²+80²), dlugosc skrzydla po pow.)
//   kula_srednica         24 mm  (Jacek)
//   mostek_szer           36 mm  (kula 24 + 12 mm zapas)
//   gz_srodek             ~50 mm od podstawy
//
// PRZED DRUKIEM ZMIERZ:
//   - kule na dragu (kula_srednica)
//   - szyjke draga nad kula (wpust_srednica)
//   - grubosc drutu spr. (drut_srednica)
//
// PROBA KALIBRACYJNA:
//   1. czesc="podglad_gniazda" - drukuj, sprawdz opor kulki
//   2. Kalibruj kula_luz (+/-0.1)
//   3. Pelny wydruk: PETG, kalenica gora, bez podpor, warstwa 0.2, dysza 0.4
//
// ============================================================================
// HISTORIA WERSJI
// ============================================================================
// v1: klin Λ + rzedy "tarki" -> BLAD: zle id. jako tarka do gk
// v2: katownik L             -> BLAD: zle interpret. widok slicera
// v3: prostopadloscian       -> BLAD: zle interpret. m01 "BE HOLLOW INSIDE"
// v4: klin Λ z czolowymi     -> BLAD: za wask i zly kat
// v5: klin 93° bez czol      -> BLAD: gniazdo w kalenicy zamiast od spodu
// v6: gniazdo w mostku       -> BLAD: czolo otwarte, napis na kalenicy,
//                               kat 93° niespojny z wymiarami Jacka
// v7 (TA WERSJA):
//   - czolo ZAMKNIETE (grubosc_czola mm lita sciana przy y=0)
//   - napis "morph" WYPUKLY na czole (jak na zdjeciach z paczki)
//   - kat wynikajacy z wys=100 + pol-pod=80: ~77° (nie 93°)
//   - parametry glowne = wys_glowna + polowa_podstawy (latwiejsze do pomiaru)
//   - plaster_wl=false domyslnie (telefon)
//   - napis_font="" domyslnie (telefon/Playground)
// ============================================================================
